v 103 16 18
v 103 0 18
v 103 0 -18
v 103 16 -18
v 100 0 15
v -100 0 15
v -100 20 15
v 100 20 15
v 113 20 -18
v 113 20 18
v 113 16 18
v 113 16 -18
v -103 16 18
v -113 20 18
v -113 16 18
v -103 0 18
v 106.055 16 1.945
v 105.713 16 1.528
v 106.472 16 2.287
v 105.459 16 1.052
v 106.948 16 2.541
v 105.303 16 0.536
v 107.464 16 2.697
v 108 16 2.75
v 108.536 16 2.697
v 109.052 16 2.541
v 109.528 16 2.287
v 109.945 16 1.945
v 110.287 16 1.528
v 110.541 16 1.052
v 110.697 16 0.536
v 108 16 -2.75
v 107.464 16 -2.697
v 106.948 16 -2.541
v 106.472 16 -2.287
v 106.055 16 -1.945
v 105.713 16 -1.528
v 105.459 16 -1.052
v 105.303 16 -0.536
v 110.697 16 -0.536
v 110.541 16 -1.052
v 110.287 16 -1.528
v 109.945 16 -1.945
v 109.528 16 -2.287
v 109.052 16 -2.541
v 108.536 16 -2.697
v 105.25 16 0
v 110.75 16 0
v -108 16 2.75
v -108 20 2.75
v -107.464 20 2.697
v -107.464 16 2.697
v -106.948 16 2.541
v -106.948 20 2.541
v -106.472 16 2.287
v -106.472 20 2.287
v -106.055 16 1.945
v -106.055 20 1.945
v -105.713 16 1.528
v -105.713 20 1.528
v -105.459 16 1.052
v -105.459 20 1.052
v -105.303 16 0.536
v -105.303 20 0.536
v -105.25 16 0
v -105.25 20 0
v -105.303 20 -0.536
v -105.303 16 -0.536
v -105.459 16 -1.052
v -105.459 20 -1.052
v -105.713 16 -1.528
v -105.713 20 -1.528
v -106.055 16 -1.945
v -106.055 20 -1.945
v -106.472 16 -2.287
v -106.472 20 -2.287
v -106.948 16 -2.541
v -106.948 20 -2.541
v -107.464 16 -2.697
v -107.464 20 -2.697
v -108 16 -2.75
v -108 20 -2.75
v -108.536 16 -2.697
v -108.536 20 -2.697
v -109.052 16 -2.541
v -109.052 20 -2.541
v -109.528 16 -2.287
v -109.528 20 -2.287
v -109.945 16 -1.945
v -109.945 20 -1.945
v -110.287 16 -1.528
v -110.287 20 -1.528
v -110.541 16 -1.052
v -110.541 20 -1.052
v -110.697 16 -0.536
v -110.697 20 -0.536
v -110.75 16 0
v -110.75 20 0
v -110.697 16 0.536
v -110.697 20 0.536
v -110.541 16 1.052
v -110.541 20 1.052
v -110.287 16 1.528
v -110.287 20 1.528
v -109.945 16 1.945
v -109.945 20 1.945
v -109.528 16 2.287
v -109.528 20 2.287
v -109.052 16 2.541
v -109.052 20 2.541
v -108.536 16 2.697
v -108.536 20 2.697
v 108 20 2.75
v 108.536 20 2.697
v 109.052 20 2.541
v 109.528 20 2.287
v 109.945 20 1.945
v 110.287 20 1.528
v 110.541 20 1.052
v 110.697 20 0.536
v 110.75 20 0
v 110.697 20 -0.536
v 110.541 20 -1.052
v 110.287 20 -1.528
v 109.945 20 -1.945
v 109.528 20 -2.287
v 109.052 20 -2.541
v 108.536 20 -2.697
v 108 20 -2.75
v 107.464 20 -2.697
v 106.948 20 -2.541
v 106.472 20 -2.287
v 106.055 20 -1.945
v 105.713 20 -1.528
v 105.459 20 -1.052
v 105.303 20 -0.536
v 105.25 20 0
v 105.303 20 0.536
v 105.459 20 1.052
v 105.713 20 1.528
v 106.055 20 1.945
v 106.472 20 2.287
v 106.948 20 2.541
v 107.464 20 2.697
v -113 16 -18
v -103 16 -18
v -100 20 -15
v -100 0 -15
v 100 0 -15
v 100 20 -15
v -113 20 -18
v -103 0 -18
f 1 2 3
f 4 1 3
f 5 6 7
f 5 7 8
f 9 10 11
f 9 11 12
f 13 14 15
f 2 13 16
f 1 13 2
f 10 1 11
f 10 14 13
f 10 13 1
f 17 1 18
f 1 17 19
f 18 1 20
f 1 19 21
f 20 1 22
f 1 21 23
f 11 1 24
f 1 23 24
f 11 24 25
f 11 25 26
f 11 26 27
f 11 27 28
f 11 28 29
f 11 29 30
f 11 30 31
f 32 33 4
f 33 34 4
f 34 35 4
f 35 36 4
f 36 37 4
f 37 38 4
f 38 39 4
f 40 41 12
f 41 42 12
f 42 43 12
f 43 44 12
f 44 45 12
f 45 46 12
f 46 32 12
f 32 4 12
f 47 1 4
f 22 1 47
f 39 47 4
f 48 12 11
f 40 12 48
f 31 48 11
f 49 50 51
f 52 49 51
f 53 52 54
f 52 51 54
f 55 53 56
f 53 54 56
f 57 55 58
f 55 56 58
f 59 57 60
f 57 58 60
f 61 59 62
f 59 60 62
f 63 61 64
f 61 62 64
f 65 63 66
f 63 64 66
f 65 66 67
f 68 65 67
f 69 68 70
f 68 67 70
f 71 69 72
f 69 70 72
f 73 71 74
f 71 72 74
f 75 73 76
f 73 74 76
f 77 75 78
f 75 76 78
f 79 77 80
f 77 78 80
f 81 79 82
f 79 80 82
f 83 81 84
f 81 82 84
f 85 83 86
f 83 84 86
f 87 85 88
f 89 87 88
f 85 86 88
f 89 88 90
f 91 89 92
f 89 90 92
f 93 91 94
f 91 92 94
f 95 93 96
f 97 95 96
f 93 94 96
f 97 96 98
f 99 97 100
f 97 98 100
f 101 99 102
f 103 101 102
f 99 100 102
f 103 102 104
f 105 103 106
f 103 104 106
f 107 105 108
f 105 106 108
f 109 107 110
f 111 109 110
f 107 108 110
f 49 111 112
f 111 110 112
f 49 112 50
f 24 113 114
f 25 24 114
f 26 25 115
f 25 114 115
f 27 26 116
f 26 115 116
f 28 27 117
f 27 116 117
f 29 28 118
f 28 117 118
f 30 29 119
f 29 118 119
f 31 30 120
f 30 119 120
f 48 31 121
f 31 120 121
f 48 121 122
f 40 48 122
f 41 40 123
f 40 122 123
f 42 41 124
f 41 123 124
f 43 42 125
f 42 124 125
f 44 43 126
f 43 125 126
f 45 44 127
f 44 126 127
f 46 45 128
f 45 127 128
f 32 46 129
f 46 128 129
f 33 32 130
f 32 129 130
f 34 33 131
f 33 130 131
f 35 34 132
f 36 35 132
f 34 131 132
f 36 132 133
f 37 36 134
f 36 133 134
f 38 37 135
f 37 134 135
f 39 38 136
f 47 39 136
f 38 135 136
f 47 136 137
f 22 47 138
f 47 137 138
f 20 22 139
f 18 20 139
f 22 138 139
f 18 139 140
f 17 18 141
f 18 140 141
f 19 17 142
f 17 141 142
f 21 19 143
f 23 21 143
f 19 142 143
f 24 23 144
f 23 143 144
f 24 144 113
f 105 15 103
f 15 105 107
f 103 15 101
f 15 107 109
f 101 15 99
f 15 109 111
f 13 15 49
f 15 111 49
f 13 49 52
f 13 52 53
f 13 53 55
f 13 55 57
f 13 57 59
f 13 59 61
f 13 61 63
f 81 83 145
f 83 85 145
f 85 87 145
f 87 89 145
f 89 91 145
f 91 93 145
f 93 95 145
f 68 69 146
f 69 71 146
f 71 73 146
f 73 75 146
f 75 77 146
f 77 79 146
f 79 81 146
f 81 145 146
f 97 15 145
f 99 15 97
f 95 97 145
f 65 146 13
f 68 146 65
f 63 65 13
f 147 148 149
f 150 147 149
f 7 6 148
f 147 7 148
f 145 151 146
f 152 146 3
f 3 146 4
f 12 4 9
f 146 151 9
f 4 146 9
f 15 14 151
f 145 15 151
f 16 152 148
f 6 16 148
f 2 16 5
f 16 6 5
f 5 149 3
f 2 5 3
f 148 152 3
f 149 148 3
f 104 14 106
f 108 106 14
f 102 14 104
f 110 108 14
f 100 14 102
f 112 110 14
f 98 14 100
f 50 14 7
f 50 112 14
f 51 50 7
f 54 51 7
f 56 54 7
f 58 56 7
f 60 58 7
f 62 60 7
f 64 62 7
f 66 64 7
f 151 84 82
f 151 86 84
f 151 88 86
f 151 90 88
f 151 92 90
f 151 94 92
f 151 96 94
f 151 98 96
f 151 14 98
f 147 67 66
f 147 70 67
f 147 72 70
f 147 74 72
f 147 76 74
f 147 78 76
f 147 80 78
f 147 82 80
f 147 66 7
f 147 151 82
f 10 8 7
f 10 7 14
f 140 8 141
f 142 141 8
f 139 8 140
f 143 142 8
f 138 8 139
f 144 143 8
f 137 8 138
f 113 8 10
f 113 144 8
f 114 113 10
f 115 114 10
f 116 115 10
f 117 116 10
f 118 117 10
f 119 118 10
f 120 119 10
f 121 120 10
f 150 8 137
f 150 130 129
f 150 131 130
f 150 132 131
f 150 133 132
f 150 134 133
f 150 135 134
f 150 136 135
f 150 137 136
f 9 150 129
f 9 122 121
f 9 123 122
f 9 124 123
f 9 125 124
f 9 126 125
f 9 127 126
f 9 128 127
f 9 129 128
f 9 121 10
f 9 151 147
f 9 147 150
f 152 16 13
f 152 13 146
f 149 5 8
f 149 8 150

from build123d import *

# Parameters (mm, degrees)
SKETCH_1_W          = 206
SKETCH_1_H          = 36
SKETCH_1_W_2        = 200
SKETCH_1_H_2        = 30
EXTRUDE_1_DEPTH     = 20
SKETCH_2_W          = 10
SKETCH_2_H          = 36
EXTRUDE_2_DEPTH     = 4
SKETCH_3_R          = 2.75
CUT_EXTRUDE_1_DEPTH = 4


with BuildPart() as part:
    # 草图1 → 凸台-拉伸1 (new body)
    with BuildSketch(Plane(origin=(0, 0, 0), x_dir=(1, 0, 0), z_dir=(0, 1, 0))):
        Rectangle(SKETCH_1_W, SKETCH_1_H)
        Rectangle(SKETCH_1_W_2, SKETCH_1_H_2, mode=Mode.SUBTRACT)
    extrude(amount=EXTRUDE_1_DEPTH)

    # 草图2 → 凸台-拉伸2 (add)
    with BuildSketch(Plane(origin=(0, 20, 0), x_dir=(1, 0, 0), z_dir=(0, 1, 0))):
        with Locations((-108, 0)):
            Rectangle(SKETCH_2_W, SKETCH_2_H)
        with Locations((108, 0)):
            Rectangle(SKETCH_2_W, SKETCH_2_H)
    extrude(amount=-EXTRUDE_2_DEPTH)

    # 草图3 → 切除-拉伸1 (cut)
    with BuildSketch(Plane(origin=(0, 20, 0), x_dir=(1, 0, 0), z_dir=(0, 1, 0))):
        with Locations(Location((108, 0, 0), (0, 0, 270))):
            Circle(SKETCH_3_R)
        with Locations(Location((-108, 0, 0), (0, 0, 270))):
            Circle(SKETCH_3_R)
    extrude(amount=-CUT_EXTRUDE_1_DEPTH, mode=Mode.SUBTRACT)


solid = part.part
